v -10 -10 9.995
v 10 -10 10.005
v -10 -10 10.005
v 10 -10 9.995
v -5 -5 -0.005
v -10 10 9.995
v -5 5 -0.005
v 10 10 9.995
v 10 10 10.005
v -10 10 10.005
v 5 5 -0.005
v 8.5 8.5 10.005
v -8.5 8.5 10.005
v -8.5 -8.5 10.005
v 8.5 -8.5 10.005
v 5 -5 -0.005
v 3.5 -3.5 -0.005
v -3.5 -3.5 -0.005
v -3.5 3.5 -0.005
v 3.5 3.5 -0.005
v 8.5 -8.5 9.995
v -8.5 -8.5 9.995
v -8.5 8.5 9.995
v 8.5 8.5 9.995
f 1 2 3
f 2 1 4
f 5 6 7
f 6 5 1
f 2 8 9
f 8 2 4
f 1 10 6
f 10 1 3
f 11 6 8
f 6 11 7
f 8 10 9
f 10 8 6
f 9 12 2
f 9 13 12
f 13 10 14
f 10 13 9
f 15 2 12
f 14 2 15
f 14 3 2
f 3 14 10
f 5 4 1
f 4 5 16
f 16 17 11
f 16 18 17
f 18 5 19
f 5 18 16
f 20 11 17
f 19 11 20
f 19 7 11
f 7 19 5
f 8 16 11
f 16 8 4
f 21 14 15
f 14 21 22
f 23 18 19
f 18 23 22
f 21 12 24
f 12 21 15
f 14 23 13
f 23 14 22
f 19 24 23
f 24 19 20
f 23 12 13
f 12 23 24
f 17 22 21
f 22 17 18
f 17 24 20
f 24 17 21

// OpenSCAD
//-----------------------------------------------------------------------------------
module make_trapezoid( from = [10,10] , to = [20,20] , h = 10)
{
    difference()
    {

        offset_x = (to.x - from.x)/2;
        offset_y = (to.y - to.y)/2;
       
        assert ( from.x < to.x, "reverse direction");
        {
            
            hull()
            {
                {
                    color("RED")
                    cube([from.x, from.y, .01], true );

                    translate([0,0, h])
                    color("BLUE")
                    cube([to.x, to.y, .01], true);
                }
            }
        }

        {
            
            hull()
            {
                {
                    color("RED")
                    cube([from.x - 3, from.y - 3, .01], true );

                    translate([0,0, h])
                    color("BLUE")
                    cube([to.x -3 , to.y - 3, .01], true);
                }
            }
        }
        
    }
/*    
    color("RED")
    cube([from.x, from.y, .01], true );

    translate([0,0, h])
    color("BLUE")
    cube([to.x, to.y, .01], true);
*/
   
}

make_trapezoid();
